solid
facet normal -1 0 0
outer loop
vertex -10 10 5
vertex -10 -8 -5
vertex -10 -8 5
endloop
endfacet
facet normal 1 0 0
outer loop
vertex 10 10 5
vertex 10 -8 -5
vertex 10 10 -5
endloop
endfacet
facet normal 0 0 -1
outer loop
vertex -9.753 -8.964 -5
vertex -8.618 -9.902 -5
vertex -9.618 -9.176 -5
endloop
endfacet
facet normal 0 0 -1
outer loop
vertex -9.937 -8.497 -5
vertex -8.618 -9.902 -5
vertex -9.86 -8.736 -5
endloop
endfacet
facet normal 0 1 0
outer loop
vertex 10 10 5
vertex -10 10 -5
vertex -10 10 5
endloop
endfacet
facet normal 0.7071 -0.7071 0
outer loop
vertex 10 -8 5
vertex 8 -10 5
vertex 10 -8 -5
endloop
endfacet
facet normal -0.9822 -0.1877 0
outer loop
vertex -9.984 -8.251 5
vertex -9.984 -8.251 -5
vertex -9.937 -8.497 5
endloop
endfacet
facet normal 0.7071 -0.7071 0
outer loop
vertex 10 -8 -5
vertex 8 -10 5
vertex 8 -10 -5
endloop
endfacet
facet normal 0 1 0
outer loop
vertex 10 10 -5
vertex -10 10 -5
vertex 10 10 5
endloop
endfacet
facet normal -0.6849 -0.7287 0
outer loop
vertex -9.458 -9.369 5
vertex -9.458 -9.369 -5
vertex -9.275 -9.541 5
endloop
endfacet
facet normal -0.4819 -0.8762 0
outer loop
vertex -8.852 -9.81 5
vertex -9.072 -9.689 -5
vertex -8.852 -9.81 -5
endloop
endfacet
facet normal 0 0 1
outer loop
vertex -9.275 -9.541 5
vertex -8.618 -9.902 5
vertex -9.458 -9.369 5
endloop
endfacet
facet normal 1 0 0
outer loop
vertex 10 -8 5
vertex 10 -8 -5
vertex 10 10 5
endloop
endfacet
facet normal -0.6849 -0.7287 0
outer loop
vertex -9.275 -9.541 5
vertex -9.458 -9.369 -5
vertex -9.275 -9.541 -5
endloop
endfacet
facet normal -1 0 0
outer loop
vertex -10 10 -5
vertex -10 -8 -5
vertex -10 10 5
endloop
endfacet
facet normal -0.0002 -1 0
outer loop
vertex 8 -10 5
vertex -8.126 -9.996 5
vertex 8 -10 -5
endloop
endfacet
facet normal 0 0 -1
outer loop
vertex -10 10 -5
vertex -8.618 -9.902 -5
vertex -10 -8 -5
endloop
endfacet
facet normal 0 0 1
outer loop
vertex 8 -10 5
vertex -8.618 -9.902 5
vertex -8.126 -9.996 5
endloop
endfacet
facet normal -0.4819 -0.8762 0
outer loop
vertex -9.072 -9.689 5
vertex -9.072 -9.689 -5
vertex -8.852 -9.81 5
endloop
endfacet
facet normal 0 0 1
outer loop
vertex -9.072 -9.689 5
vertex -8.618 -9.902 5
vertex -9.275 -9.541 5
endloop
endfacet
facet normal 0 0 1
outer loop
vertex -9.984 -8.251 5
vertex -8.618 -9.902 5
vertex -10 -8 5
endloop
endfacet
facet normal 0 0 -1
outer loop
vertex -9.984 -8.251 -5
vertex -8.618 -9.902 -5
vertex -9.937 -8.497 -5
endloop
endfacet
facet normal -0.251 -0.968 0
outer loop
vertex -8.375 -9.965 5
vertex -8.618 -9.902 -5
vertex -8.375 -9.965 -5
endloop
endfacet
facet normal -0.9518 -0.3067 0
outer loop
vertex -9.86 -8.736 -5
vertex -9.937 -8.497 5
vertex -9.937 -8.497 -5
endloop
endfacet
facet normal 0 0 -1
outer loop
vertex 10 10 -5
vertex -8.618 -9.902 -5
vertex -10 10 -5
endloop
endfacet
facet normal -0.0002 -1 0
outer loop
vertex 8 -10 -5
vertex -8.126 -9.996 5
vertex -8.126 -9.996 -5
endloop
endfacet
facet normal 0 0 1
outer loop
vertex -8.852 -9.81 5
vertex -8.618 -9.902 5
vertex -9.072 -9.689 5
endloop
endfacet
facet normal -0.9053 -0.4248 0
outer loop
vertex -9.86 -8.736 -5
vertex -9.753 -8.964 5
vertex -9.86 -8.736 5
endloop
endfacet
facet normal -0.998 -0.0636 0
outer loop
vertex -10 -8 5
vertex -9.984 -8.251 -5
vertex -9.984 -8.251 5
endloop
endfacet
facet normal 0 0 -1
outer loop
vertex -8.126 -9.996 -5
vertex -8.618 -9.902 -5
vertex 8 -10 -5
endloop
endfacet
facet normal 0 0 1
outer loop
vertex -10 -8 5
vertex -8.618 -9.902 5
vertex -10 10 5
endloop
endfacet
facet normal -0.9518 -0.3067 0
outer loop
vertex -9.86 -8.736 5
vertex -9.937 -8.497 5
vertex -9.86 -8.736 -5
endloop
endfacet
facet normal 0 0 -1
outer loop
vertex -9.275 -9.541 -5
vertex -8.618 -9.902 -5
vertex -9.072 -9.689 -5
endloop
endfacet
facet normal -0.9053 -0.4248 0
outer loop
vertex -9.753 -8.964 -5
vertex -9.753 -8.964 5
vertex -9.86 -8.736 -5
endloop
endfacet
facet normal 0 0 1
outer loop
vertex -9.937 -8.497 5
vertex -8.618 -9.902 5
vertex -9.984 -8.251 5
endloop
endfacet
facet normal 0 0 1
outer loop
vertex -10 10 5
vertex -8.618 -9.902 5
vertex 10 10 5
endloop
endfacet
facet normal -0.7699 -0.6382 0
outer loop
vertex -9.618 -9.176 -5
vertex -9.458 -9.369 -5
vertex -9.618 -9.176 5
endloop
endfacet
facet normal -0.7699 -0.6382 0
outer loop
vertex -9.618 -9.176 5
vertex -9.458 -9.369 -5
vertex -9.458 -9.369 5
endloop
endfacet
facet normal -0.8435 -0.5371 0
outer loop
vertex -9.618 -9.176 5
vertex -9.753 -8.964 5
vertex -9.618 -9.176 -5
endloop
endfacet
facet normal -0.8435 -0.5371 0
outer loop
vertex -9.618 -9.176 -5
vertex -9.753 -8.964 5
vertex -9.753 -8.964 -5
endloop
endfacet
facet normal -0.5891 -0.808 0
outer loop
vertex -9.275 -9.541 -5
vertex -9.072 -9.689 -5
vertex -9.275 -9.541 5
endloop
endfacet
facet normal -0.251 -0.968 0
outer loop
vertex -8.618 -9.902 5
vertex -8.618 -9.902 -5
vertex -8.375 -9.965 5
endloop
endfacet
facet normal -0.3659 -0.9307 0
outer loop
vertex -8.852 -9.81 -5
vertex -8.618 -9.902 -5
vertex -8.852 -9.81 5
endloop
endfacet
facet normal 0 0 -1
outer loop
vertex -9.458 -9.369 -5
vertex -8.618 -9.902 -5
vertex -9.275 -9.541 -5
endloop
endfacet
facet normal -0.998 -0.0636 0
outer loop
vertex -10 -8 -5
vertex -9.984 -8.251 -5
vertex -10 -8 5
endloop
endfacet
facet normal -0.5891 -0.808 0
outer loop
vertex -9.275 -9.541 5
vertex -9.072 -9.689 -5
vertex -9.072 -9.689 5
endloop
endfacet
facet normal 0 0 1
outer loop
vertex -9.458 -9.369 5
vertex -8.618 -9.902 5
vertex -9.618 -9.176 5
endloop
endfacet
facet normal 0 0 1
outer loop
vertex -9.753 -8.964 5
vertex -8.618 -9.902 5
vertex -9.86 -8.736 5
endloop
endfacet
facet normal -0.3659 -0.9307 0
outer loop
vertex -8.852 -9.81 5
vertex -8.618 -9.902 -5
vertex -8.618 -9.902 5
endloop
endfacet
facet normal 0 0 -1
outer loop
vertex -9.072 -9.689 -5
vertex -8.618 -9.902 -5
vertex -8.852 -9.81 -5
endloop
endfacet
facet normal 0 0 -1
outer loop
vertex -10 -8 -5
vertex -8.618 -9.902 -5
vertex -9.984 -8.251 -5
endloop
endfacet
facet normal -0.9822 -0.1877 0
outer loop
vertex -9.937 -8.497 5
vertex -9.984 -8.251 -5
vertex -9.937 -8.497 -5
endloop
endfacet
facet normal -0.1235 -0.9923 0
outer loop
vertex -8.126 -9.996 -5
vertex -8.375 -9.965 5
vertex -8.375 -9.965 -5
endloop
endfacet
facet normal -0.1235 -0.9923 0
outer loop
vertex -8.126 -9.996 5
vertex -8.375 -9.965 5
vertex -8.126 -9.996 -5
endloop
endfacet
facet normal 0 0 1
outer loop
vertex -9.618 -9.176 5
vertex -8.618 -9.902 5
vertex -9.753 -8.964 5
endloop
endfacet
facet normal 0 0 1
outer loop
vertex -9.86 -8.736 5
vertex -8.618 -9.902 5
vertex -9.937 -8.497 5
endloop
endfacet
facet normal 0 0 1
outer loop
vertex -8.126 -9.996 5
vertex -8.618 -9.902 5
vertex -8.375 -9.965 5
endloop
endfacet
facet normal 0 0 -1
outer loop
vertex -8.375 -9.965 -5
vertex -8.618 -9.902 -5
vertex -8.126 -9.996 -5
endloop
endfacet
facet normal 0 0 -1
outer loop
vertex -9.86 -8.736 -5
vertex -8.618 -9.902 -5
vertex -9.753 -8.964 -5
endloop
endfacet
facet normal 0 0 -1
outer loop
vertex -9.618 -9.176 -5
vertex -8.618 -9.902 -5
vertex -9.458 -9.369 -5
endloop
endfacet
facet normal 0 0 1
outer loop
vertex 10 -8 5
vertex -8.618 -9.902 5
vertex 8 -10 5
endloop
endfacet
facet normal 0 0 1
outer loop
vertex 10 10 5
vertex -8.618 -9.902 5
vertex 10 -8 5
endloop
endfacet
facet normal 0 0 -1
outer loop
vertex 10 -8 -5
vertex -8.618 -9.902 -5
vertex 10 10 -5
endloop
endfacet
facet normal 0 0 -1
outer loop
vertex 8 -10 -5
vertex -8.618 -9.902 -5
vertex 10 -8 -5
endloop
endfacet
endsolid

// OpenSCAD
// file: rcylinder.scad
//-- Cilindro redondeado en las tapas
//-- Parametros:
//-- r: radio del cilindro
//-- h: Altura del cilindro
//-- center : [true, false], centrar el cilindro
//-- both: [true, false]
//--    true: Redondear ambas tapas (superior e inferior)
//--    false: solo se redondea la tapa superior
module rcylinder(r = 4, 
                 h = 20, 
                 center = false, 
                 both = false, $fn = 30)
{

  //-- Calcular la altura del cilindro interior
  //-- Si redondeo por las dos tapas, vale h - 2*r
  //-- si solo una tapa entonces h - r
  hc = (both == true) ? h - 2 * r : h - r;
  
  //-- Calcular la traslacion para centrar el cilindro
  posc = (center == true) ? 0 : h/2;
  
  //-- Aplicar traslaciopn para el centrado
  translate([0, 0, posc]) 
  
    //-- Cilindro con ambas tapas redondeadas
    //-- Se pone un cilindro de altura hc y una esfera
    //-- en la parte superior y otra en la inferior
    if (both == true) {
      cylinder(r = r, h = hc, center = true, $fn = $fn);
      
      //-- Esferas superior e inferior
      for (i = [-1, 1])
        translate([0, 0, i * hc / 2])
          sphere(r = r);
          
    }
    //-- Cilindro con tapa superior redondeada
    else
      //-- Centrar la figura
      translate([0, 0, -h/2]) {
      
        //-- Cilindro + esfera
        cylinder(r = r, h = hc, $fn = $fn);
          translate([0, 0, hc]) sphere(r = r, $fn = $fn);
      }
        
}

//-- Parametros para los ejemplos
r = 5;
h = 30;
center = false;
$fn = 30;

//-- Cilindro normal
translate([-3*r, 0, 0])  
  cylinder(r = r, h = h, center = center, $fn = $fn);

//-- Cilindro con tapa superior redondeada
rcylinder(r = r, h = h, both = false, center = center, $fn = $fn);

//-- Cilindro con ambas tapas redondeadas
translate([3*r, 0, 0])  
  rcylinder(r = r, h = h, both = true, center = center, $fn = $fn);
  
  
// main file
use <rcylinder.scad>

X = 0;
Y = 1;
Z = 2;


//-- Parametros del cubo
size = [20, 20, 10];
r = 2;

//-- Calcular las coordenadas de la esquina del cuadrante 1
xc = size[X]/2 - r;
yc = size[Y]/2 - r;
zc = size[Z]/2;

//-- Tamaño de las columnas cuadradas
col_size = [2 * r, 2 * r, size[Z]];

//-- Posiciones de las columnas
vertex = [
  [xc, yc, 0],
  [-xc, yc, 0],
  [-xc, -yc, 0],
  [xc, -yc, 0],
];

//-- Ejemplo 1:  Modificacion de las aristas verticales
module example1() 
{

  hull() {
    for (v = [0:1]) 
      translate(vertex[v])
	cube(col_size, center = true);
	//cylinder(r = r, h = size[Z], center = true, $fn = 4);
	
    translate(vertex[2])
      cylinder(r = r, h = size[Z], center = true, $fn = 50);    
	
    translate(vertex[3])
      cylinder(r = r, h = size[Z], center = true, $fn = 4);
  }
}

//-- Ejemplo 2: Modificacion de las aristas horizontales y verticales
module example2()
{
  hull() {
  for (v = [0:3]) 
    translate(vertex[v])
      //cylinder(r = r, h = size[Z], center = true, $fn = 50);
      rcylinder(r = r, h = size[Z], both = false, center = true, $fn = 40);
      //rcylinder(r = r, h = size[Z], both = true, center = true, $fn = 40);
      
  }
}

//-- Ejemplos para probar

example1();
//example2();
